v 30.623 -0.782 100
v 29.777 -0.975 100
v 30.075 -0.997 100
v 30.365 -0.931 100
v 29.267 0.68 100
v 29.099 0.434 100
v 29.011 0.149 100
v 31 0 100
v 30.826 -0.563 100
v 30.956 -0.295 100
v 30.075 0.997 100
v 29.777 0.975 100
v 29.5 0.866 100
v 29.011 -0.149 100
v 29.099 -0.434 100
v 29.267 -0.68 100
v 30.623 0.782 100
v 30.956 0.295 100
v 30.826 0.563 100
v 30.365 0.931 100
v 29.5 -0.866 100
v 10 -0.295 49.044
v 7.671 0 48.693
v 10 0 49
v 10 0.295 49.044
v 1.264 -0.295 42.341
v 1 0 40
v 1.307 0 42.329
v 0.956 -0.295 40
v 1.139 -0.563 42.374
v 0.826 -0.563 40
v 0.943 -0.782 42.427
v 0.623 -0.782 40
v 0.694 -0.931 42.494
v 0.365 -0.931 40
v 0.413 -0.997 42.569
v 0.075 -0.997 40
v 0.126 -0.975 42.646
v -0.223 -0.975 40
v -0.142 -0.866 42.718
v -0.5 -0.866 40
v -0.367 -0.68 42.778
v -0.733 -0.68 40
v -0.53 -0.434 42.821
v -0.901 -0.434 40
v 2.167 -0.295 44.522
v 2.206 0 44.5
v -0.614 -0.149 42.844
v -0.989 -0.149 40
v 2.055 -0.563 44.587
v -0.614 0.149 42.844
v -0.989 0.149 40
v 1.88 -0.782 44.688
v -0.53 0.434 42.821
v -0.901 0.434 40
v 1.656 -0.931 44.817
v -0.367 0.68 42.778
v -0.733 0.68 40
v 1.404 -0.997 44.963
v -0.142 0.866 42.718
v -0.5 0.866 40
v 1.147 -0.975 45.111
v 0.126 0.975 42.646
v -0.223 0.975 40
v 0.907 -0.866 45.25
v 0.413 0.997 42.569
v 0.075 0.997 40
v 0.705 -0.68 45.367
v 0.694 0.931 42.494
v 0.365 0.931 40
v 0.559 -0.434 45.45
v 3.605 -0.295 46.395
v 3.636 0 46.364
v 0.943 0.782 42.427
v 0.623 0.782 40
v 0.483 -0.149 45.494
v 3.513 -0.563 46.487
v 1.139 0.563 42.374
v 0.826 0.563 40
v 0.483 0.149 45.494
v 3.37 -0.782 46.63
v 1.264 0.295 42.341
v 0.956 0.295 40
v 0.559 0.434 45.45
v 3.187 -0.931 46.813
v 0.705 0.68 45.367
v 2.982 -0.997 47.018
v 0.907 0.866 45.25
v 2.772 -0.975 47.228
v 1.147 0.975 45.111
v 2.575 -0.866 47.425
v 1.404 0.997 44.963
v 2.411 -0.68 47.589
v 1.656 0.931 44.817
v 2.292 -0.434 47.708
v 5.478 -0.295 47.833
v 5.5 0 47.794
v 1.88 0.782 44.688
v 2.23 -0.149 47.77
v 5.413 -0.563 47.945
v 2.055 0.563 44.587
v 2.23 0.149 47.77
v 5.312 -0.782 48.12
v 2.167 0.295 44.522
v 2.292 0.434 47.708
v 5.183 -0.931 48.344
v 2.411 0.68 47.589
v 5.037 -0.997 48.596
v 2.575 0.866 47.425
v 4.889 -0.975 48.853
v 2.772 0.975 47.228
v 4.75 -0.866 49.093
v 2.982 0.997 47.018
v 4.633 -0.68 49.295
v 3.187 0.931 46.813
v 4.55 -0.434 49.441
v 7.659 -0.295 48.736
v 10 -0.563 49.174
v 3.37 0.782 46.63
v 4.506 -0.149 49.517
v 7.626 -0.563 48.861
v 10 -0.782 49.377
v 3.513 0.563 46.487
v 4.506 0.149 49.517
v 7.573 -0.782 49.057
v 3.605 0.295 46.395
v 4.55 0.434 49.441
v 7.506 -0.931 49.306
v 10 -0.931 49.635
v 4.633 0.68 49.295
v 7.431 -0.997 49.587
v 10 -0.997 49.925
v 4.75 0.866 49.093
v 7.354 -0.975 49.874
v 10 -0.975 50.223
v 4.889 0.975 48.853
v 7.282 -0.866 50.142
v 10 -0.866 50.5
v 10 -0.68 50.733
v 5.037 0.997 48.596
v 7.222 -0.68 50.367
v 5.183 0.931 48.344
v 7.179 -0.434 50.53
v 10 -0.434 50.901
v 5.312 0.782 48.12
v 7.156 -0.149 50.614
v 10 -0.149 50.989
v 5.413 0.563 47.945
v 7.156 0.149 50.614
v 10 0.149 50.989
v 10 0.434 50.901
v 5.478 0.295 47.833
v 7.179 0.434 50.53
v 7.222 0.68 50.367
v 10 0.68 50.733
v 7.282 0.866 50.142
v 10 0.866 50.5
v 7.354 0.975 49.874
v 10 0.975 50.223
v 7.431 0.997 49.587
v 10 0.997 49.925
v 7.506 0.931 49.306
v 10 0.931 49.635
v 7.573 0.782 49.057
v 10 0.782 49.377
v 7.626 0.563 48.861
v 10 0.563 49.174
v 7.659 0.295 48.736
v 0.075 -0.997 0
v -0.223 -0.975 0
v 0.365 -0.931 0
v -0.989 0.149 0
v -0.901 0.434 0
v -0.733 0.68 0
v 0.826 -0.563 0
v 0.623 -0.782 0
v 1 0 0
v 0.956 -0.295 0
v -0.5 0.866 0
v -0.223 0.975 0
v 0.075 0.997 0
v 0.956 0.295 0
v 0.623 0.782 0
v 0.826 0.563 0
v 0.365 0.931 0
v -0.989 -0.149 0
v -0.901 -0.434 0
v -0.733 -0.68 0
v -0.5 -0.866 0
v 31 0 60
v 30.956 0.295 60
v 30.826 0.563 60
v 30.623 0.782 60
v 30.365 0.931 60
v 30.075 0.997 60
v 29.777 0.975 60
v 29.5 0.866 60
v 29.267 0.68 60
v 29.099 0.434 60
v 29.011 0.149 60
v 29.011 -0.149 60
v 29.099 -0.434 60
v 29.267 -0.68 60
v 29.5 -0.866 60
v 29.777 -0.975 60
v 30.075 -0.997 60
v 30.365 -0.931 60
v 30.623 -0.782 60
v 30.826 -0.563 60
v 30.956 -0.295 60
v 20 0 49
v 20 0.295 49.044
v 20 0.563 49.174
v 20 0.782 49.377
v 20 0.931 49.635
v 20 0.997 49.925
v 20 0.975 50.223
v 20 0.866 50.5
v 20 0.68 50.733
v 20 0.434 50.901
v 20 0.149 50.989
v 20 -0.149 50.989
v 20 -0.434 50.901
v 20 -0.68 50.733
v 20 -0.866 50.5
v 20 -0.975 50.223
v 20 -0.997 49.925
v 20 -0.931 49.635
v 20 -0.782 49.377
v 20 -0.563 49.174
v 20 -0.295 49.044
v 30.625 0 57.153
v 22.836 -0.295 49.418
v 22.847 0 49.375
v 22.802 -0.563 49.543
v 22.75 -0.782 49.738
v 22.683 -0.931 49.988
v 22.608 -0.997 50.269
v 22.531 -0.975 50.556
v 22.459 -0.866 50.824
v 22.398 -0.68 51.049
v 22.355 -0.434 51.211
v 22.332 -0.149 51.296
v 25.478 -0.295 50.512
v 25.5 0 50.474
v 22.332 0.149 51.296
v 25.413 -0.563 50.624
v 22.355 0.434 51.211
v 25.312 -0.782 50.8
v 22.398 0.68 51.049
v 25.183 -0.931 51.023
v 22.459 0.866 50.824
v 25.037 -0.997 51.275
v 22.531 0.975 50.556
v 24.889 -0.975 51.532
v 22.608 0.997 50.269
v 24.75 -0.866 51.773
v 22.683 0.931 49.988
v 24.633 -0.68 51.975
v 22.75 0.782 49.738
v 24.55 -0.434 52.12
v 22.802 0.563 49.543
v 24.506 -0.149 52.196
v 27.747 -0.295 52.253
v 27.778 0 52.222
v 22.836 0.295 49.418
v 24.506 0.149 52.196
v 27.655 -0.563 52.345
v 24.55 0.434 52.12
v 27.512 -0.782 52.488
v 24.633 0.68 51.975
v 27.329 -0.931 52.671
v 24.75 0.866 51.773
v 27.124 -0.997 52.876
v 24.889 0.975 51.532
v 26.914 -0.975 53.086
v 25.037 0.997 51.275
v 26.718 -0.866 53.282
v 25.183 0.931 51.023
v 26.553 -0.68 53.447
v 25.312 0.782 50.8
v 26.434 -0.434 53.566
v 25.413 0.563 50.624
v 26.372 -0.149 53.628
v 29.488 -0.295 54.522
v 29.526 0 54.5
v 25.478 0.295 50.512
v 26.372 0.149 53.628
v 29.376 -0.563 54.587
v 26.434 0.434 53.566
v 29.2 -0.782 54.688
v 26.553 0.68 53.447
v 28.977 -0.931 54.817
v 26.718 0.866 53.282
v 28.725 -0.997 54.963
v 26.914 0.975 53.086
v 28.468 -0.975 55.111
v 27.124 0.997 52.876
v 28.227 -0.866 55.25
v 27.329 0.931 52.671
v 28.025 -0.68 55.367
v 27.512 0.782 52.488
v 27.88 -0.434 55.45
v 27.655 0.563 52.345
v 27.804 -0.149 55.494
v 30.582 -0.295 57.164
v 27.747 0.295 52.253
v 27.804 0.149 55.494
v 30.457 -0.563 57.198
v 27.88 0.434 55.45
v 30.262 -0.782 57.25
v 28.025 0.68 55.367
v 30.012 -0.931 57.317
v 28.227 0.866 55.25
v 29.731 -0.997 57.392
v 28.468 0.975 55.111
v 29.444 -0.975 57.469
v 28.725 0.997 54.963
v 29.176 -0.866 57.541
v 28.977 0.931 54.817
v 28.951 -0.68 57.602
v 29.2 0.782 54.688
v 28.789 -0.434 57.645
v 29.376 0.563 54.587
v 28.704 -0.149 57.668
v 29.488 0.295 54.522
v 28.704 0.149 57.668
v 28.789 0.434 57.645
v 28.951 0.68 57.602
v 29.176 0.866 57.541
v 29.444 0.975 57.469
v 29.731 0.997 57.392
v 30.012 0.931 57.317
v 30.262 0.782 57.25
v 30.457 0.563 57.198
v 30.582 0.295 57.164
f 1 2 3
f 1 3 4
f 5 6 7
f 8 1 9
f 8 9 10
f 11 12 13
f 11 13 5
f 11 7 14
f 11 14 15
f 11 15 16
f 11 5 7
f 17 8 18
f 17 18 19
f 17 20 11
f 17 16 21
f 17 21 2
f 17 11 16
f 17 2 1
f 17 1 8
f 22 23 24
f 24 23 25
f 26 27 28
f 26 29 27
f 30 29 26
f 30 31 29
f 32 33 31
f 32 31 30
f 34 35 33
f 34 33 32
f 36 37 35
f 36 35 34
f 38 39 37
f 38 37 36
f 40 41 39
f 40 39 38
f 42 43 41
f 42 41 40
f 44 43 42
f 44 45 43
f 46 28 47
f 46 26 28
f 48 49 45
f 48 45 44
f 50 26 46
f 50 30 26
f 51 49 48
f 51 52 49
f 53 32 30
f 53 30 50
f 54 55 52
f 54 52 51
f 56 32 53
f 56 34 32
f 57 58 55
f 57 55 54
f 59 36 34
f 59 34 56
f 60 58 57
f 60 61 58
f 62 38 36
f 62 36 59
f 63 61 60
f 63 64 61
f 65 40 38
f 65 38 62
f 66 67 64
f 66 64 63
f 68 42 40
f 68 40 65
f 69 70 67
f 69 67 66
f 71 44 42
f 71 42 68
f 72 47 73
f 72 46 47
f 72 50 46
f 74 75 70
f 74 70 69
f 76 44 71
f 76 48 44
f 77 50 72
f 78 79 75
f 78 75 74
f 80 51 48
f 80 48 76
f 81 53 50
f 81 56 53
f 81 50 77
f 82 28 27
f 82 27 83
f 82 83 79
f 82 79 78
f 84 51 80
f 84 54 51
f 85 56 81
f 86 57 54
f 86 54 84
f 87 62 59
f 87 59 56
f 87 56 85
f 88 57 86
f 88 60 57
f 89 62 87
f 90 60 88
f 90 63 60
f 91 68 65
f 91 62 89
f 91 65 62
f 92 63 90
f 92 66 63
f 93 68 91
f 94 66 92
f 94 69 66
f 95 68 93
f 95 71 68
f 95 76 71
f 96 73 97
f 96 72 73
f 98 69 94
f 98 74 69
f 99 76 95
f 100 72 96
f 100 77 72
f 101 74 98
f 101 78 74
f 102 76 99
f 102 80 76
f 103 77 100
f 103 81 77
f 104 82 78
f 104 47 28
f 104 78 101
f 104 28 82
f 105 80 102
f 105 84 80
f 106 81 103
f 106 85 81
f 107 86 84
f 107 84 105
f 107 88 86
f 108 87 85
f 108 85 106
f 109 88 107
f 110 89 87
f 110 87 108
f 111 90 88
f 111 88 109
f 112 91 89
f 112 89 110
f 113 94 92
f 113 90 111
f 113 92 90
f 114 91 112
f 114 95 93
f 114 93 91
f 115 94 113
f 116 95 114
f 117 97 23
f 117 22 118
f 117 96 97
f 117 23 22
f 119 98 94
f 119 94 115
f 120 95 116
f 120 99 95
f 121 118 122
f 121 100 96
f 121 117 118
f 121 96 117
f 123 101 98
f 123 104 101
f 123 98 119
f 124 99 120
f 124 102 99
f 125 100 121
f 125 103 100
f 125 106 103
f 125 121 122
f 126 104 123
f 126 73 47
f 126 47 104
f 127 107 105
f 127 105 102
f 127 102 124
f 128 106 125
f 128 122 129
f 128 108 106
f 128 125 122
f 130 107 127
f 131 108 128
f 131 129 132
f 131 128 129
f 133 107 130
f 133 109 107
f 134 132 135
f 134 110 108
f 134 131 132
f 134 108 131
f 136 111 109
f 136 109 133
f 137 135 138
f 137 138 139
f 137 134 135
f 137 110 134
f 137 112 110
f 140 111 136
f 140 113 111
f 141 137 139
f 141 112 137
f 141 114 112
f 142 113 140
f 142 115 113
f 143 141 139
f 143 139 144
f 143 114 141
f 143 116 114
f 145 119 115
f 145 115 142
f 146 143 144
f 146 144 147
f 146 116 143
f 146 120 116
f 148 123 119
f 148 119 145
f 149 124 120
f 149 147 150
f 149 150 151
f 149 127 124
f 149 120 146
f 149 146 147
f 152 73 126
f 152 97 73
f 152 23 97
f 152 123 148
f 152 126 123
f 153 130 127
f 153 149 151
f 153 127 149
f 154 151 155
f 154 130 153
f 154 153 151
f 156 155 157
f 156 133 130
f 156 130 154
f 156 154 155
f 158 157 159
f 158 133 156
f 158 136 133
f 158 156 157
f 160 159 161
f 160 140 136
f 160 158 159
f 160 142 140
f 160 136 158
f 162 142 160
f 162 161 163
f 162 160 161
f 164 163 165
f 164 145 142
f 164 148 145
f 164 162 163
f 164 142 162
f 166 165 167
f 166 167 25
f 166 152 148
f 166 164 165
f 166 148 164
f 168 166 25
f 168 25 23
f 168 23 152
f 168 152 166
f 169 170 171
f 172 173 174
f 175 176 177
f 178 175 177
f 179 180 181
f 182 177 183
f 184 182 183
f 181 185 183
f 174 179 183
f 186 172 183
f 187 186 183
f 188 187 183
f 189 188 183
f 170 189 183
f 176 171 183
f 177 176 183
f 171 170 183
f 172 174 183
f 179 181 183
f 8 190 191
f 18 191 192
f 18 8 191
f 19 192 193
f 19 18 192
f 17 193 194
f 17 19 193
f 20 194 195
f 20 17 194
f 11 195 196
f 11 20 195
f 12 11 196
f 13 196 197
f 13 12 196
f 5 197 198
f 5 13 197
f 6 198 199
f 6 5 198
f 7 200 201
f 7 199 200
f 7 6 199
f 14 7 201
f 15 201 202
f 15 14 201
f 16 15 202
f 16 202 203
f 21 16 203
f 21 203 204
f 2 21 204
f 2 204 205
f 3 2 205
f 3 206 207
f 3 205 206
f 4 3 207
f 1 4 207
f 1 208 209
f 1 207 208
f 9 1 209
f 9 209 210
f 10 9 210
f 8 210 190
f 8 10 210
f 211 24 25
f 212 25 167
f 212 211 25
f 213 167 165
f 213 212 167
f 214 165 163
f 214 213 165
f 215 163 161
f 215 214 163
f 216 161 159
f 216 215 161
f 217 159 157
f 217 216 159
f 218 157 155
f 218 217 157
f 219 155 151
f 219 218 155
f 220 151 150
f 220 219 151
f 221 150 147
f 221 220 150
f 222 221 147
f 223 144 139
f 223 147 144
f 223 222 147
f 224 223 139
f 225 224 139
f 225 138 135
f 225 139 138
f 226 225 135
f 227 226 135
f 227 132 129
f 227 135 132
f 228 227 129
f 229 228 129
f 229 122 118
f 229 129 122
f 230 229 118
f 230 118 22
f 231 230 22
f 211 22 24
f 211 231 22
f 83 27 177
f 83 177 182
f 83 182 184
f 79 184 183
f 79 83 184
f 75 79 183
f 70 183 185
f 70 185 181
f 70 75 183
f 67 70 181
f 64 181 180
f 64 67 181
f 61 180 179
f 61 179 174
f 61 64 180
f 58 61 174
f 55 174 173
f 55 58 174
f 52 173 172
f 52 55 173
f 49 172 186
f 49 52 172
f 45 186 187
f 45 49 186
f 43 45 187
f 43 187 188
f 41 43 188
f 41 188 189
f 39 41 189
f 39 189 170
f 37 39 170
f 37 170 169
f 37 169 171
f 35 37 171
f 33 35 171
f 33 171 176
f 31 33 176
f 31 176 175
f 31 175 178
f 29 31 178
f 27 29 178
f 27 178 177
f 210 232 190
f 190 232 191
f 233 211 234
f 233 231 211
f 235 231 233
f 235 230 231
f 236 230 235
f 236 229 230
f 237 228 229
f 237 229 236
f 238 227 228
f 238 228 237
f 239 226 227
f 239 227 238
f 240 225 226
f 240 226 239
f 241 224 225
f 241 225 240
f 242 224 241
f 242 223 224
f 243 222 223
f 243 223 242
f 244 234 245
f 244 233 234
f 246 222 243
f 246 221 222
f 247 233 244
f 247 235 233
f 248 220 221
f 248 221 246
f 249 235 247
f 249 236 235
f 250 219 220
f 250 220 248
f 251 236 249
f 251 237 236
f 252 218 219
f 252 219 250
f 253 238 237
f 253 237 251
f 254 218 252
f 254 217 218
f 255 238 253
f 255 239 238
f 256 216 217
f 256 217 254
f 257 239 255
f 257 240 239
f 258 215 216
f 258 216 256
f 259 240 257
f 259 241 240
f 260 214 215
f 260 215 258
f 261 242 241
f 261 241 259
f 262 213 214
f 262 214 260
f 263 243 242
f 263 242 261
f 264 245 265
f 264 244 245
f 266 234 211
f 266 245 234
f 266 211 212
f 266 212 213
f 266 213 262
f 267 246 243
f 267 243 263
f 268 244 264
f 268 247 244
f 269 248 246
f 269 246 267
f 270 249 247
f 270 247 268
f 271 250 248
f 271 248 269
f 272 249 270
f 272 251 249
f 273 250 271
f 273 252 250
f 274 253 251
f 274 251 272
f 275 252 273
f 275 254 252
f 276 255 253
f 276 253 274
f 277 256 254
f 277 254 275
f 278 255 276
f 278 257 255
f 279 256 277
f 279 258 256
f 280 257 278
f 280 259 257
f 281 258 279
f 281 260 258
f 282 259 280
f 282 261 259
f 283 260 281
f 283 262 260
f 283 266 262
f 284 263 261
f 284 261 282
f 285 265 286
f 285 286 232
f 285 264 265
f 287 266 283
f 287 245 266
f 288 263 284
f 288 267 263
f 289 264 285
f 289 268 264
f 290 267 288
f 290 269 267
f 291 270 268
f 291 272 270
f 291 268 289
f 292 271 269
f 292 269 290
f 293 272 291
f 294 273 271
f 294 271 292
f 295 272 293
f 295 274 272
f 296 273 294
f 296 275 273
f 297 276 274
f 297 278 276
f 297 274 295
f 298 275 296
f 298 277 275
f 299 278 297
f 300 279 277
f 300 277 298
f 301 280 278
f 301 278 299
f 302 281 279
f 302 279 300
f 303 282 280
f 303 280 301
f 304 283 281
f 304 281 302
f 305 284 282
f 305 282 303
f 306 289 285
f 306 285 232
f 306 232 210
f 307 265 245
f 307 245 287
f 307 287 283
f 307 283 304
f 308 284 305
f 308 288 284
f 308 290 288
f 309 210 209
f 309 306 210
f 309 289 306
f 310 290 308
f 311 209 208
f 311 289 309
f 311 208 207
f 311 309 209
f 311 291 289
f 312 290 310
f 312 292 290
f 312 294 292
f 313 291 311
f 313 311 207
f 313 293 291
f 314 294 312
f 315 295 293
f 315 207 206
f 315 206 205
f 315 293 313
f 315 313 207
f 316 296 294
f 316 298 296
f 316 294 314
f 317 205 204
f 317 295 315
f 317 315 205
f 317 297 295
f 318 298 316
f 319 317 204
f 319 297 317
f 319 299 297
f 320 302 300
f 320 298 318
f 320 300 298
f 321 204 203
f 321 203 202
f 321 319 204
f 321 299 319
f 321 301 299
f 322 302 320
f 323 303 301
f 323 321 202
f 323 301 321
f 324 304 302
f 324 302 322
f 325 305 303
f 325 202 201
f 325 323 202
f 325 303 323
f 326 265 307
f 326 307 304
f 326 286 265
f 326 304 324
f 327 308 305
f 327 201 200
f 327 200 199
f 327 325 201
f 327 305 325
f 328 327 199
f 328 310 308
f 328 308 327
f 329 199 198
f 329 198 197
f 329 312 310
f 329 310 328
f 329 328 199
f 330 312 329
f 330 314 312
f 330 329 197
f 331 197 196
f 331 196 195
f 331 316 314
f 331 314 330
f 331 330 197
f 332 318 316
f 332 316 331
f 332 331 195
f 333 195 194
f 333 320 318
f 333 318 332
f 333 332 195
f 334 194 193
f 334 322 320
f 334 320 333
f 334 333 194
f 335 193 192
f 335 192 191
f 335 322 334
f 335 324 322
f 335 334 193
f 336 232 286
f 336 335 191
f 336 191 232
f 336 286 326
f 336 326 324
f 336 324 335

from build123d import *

# Parameters (mm, degrees)
SKETCH_1_R = 1


with BuildPart() as part:
    # ｽｲｰﾌﾟ1: sweep along a path in ｽｹｯﾁ2
    with BuildLine(Plane(origin=(0, 0, 0), x_dir=(1, 0, 0), z_dir=(0, 1, 0))) as sweep_1_path:
        Line((0, 0), (0, -40))
        ThreePointArc((0, -40), (2.928932188, -47.071067812), (10, -50))
        Line((10, -50), (20, -50))
        ThreePointArc((20, -50), (27.071067812, -52.928932188), (30, -60))
        Line((30, -60), (30, -100))
    # ｽｹｯﾁ1 → ｽｲｰﾌﾟ1 (sweep)
    with BuildSketch(Plane.XY):
        Circle(SKETCH_1_R)
    sweep(path=sweep_1_path.line)


solid = part.part
